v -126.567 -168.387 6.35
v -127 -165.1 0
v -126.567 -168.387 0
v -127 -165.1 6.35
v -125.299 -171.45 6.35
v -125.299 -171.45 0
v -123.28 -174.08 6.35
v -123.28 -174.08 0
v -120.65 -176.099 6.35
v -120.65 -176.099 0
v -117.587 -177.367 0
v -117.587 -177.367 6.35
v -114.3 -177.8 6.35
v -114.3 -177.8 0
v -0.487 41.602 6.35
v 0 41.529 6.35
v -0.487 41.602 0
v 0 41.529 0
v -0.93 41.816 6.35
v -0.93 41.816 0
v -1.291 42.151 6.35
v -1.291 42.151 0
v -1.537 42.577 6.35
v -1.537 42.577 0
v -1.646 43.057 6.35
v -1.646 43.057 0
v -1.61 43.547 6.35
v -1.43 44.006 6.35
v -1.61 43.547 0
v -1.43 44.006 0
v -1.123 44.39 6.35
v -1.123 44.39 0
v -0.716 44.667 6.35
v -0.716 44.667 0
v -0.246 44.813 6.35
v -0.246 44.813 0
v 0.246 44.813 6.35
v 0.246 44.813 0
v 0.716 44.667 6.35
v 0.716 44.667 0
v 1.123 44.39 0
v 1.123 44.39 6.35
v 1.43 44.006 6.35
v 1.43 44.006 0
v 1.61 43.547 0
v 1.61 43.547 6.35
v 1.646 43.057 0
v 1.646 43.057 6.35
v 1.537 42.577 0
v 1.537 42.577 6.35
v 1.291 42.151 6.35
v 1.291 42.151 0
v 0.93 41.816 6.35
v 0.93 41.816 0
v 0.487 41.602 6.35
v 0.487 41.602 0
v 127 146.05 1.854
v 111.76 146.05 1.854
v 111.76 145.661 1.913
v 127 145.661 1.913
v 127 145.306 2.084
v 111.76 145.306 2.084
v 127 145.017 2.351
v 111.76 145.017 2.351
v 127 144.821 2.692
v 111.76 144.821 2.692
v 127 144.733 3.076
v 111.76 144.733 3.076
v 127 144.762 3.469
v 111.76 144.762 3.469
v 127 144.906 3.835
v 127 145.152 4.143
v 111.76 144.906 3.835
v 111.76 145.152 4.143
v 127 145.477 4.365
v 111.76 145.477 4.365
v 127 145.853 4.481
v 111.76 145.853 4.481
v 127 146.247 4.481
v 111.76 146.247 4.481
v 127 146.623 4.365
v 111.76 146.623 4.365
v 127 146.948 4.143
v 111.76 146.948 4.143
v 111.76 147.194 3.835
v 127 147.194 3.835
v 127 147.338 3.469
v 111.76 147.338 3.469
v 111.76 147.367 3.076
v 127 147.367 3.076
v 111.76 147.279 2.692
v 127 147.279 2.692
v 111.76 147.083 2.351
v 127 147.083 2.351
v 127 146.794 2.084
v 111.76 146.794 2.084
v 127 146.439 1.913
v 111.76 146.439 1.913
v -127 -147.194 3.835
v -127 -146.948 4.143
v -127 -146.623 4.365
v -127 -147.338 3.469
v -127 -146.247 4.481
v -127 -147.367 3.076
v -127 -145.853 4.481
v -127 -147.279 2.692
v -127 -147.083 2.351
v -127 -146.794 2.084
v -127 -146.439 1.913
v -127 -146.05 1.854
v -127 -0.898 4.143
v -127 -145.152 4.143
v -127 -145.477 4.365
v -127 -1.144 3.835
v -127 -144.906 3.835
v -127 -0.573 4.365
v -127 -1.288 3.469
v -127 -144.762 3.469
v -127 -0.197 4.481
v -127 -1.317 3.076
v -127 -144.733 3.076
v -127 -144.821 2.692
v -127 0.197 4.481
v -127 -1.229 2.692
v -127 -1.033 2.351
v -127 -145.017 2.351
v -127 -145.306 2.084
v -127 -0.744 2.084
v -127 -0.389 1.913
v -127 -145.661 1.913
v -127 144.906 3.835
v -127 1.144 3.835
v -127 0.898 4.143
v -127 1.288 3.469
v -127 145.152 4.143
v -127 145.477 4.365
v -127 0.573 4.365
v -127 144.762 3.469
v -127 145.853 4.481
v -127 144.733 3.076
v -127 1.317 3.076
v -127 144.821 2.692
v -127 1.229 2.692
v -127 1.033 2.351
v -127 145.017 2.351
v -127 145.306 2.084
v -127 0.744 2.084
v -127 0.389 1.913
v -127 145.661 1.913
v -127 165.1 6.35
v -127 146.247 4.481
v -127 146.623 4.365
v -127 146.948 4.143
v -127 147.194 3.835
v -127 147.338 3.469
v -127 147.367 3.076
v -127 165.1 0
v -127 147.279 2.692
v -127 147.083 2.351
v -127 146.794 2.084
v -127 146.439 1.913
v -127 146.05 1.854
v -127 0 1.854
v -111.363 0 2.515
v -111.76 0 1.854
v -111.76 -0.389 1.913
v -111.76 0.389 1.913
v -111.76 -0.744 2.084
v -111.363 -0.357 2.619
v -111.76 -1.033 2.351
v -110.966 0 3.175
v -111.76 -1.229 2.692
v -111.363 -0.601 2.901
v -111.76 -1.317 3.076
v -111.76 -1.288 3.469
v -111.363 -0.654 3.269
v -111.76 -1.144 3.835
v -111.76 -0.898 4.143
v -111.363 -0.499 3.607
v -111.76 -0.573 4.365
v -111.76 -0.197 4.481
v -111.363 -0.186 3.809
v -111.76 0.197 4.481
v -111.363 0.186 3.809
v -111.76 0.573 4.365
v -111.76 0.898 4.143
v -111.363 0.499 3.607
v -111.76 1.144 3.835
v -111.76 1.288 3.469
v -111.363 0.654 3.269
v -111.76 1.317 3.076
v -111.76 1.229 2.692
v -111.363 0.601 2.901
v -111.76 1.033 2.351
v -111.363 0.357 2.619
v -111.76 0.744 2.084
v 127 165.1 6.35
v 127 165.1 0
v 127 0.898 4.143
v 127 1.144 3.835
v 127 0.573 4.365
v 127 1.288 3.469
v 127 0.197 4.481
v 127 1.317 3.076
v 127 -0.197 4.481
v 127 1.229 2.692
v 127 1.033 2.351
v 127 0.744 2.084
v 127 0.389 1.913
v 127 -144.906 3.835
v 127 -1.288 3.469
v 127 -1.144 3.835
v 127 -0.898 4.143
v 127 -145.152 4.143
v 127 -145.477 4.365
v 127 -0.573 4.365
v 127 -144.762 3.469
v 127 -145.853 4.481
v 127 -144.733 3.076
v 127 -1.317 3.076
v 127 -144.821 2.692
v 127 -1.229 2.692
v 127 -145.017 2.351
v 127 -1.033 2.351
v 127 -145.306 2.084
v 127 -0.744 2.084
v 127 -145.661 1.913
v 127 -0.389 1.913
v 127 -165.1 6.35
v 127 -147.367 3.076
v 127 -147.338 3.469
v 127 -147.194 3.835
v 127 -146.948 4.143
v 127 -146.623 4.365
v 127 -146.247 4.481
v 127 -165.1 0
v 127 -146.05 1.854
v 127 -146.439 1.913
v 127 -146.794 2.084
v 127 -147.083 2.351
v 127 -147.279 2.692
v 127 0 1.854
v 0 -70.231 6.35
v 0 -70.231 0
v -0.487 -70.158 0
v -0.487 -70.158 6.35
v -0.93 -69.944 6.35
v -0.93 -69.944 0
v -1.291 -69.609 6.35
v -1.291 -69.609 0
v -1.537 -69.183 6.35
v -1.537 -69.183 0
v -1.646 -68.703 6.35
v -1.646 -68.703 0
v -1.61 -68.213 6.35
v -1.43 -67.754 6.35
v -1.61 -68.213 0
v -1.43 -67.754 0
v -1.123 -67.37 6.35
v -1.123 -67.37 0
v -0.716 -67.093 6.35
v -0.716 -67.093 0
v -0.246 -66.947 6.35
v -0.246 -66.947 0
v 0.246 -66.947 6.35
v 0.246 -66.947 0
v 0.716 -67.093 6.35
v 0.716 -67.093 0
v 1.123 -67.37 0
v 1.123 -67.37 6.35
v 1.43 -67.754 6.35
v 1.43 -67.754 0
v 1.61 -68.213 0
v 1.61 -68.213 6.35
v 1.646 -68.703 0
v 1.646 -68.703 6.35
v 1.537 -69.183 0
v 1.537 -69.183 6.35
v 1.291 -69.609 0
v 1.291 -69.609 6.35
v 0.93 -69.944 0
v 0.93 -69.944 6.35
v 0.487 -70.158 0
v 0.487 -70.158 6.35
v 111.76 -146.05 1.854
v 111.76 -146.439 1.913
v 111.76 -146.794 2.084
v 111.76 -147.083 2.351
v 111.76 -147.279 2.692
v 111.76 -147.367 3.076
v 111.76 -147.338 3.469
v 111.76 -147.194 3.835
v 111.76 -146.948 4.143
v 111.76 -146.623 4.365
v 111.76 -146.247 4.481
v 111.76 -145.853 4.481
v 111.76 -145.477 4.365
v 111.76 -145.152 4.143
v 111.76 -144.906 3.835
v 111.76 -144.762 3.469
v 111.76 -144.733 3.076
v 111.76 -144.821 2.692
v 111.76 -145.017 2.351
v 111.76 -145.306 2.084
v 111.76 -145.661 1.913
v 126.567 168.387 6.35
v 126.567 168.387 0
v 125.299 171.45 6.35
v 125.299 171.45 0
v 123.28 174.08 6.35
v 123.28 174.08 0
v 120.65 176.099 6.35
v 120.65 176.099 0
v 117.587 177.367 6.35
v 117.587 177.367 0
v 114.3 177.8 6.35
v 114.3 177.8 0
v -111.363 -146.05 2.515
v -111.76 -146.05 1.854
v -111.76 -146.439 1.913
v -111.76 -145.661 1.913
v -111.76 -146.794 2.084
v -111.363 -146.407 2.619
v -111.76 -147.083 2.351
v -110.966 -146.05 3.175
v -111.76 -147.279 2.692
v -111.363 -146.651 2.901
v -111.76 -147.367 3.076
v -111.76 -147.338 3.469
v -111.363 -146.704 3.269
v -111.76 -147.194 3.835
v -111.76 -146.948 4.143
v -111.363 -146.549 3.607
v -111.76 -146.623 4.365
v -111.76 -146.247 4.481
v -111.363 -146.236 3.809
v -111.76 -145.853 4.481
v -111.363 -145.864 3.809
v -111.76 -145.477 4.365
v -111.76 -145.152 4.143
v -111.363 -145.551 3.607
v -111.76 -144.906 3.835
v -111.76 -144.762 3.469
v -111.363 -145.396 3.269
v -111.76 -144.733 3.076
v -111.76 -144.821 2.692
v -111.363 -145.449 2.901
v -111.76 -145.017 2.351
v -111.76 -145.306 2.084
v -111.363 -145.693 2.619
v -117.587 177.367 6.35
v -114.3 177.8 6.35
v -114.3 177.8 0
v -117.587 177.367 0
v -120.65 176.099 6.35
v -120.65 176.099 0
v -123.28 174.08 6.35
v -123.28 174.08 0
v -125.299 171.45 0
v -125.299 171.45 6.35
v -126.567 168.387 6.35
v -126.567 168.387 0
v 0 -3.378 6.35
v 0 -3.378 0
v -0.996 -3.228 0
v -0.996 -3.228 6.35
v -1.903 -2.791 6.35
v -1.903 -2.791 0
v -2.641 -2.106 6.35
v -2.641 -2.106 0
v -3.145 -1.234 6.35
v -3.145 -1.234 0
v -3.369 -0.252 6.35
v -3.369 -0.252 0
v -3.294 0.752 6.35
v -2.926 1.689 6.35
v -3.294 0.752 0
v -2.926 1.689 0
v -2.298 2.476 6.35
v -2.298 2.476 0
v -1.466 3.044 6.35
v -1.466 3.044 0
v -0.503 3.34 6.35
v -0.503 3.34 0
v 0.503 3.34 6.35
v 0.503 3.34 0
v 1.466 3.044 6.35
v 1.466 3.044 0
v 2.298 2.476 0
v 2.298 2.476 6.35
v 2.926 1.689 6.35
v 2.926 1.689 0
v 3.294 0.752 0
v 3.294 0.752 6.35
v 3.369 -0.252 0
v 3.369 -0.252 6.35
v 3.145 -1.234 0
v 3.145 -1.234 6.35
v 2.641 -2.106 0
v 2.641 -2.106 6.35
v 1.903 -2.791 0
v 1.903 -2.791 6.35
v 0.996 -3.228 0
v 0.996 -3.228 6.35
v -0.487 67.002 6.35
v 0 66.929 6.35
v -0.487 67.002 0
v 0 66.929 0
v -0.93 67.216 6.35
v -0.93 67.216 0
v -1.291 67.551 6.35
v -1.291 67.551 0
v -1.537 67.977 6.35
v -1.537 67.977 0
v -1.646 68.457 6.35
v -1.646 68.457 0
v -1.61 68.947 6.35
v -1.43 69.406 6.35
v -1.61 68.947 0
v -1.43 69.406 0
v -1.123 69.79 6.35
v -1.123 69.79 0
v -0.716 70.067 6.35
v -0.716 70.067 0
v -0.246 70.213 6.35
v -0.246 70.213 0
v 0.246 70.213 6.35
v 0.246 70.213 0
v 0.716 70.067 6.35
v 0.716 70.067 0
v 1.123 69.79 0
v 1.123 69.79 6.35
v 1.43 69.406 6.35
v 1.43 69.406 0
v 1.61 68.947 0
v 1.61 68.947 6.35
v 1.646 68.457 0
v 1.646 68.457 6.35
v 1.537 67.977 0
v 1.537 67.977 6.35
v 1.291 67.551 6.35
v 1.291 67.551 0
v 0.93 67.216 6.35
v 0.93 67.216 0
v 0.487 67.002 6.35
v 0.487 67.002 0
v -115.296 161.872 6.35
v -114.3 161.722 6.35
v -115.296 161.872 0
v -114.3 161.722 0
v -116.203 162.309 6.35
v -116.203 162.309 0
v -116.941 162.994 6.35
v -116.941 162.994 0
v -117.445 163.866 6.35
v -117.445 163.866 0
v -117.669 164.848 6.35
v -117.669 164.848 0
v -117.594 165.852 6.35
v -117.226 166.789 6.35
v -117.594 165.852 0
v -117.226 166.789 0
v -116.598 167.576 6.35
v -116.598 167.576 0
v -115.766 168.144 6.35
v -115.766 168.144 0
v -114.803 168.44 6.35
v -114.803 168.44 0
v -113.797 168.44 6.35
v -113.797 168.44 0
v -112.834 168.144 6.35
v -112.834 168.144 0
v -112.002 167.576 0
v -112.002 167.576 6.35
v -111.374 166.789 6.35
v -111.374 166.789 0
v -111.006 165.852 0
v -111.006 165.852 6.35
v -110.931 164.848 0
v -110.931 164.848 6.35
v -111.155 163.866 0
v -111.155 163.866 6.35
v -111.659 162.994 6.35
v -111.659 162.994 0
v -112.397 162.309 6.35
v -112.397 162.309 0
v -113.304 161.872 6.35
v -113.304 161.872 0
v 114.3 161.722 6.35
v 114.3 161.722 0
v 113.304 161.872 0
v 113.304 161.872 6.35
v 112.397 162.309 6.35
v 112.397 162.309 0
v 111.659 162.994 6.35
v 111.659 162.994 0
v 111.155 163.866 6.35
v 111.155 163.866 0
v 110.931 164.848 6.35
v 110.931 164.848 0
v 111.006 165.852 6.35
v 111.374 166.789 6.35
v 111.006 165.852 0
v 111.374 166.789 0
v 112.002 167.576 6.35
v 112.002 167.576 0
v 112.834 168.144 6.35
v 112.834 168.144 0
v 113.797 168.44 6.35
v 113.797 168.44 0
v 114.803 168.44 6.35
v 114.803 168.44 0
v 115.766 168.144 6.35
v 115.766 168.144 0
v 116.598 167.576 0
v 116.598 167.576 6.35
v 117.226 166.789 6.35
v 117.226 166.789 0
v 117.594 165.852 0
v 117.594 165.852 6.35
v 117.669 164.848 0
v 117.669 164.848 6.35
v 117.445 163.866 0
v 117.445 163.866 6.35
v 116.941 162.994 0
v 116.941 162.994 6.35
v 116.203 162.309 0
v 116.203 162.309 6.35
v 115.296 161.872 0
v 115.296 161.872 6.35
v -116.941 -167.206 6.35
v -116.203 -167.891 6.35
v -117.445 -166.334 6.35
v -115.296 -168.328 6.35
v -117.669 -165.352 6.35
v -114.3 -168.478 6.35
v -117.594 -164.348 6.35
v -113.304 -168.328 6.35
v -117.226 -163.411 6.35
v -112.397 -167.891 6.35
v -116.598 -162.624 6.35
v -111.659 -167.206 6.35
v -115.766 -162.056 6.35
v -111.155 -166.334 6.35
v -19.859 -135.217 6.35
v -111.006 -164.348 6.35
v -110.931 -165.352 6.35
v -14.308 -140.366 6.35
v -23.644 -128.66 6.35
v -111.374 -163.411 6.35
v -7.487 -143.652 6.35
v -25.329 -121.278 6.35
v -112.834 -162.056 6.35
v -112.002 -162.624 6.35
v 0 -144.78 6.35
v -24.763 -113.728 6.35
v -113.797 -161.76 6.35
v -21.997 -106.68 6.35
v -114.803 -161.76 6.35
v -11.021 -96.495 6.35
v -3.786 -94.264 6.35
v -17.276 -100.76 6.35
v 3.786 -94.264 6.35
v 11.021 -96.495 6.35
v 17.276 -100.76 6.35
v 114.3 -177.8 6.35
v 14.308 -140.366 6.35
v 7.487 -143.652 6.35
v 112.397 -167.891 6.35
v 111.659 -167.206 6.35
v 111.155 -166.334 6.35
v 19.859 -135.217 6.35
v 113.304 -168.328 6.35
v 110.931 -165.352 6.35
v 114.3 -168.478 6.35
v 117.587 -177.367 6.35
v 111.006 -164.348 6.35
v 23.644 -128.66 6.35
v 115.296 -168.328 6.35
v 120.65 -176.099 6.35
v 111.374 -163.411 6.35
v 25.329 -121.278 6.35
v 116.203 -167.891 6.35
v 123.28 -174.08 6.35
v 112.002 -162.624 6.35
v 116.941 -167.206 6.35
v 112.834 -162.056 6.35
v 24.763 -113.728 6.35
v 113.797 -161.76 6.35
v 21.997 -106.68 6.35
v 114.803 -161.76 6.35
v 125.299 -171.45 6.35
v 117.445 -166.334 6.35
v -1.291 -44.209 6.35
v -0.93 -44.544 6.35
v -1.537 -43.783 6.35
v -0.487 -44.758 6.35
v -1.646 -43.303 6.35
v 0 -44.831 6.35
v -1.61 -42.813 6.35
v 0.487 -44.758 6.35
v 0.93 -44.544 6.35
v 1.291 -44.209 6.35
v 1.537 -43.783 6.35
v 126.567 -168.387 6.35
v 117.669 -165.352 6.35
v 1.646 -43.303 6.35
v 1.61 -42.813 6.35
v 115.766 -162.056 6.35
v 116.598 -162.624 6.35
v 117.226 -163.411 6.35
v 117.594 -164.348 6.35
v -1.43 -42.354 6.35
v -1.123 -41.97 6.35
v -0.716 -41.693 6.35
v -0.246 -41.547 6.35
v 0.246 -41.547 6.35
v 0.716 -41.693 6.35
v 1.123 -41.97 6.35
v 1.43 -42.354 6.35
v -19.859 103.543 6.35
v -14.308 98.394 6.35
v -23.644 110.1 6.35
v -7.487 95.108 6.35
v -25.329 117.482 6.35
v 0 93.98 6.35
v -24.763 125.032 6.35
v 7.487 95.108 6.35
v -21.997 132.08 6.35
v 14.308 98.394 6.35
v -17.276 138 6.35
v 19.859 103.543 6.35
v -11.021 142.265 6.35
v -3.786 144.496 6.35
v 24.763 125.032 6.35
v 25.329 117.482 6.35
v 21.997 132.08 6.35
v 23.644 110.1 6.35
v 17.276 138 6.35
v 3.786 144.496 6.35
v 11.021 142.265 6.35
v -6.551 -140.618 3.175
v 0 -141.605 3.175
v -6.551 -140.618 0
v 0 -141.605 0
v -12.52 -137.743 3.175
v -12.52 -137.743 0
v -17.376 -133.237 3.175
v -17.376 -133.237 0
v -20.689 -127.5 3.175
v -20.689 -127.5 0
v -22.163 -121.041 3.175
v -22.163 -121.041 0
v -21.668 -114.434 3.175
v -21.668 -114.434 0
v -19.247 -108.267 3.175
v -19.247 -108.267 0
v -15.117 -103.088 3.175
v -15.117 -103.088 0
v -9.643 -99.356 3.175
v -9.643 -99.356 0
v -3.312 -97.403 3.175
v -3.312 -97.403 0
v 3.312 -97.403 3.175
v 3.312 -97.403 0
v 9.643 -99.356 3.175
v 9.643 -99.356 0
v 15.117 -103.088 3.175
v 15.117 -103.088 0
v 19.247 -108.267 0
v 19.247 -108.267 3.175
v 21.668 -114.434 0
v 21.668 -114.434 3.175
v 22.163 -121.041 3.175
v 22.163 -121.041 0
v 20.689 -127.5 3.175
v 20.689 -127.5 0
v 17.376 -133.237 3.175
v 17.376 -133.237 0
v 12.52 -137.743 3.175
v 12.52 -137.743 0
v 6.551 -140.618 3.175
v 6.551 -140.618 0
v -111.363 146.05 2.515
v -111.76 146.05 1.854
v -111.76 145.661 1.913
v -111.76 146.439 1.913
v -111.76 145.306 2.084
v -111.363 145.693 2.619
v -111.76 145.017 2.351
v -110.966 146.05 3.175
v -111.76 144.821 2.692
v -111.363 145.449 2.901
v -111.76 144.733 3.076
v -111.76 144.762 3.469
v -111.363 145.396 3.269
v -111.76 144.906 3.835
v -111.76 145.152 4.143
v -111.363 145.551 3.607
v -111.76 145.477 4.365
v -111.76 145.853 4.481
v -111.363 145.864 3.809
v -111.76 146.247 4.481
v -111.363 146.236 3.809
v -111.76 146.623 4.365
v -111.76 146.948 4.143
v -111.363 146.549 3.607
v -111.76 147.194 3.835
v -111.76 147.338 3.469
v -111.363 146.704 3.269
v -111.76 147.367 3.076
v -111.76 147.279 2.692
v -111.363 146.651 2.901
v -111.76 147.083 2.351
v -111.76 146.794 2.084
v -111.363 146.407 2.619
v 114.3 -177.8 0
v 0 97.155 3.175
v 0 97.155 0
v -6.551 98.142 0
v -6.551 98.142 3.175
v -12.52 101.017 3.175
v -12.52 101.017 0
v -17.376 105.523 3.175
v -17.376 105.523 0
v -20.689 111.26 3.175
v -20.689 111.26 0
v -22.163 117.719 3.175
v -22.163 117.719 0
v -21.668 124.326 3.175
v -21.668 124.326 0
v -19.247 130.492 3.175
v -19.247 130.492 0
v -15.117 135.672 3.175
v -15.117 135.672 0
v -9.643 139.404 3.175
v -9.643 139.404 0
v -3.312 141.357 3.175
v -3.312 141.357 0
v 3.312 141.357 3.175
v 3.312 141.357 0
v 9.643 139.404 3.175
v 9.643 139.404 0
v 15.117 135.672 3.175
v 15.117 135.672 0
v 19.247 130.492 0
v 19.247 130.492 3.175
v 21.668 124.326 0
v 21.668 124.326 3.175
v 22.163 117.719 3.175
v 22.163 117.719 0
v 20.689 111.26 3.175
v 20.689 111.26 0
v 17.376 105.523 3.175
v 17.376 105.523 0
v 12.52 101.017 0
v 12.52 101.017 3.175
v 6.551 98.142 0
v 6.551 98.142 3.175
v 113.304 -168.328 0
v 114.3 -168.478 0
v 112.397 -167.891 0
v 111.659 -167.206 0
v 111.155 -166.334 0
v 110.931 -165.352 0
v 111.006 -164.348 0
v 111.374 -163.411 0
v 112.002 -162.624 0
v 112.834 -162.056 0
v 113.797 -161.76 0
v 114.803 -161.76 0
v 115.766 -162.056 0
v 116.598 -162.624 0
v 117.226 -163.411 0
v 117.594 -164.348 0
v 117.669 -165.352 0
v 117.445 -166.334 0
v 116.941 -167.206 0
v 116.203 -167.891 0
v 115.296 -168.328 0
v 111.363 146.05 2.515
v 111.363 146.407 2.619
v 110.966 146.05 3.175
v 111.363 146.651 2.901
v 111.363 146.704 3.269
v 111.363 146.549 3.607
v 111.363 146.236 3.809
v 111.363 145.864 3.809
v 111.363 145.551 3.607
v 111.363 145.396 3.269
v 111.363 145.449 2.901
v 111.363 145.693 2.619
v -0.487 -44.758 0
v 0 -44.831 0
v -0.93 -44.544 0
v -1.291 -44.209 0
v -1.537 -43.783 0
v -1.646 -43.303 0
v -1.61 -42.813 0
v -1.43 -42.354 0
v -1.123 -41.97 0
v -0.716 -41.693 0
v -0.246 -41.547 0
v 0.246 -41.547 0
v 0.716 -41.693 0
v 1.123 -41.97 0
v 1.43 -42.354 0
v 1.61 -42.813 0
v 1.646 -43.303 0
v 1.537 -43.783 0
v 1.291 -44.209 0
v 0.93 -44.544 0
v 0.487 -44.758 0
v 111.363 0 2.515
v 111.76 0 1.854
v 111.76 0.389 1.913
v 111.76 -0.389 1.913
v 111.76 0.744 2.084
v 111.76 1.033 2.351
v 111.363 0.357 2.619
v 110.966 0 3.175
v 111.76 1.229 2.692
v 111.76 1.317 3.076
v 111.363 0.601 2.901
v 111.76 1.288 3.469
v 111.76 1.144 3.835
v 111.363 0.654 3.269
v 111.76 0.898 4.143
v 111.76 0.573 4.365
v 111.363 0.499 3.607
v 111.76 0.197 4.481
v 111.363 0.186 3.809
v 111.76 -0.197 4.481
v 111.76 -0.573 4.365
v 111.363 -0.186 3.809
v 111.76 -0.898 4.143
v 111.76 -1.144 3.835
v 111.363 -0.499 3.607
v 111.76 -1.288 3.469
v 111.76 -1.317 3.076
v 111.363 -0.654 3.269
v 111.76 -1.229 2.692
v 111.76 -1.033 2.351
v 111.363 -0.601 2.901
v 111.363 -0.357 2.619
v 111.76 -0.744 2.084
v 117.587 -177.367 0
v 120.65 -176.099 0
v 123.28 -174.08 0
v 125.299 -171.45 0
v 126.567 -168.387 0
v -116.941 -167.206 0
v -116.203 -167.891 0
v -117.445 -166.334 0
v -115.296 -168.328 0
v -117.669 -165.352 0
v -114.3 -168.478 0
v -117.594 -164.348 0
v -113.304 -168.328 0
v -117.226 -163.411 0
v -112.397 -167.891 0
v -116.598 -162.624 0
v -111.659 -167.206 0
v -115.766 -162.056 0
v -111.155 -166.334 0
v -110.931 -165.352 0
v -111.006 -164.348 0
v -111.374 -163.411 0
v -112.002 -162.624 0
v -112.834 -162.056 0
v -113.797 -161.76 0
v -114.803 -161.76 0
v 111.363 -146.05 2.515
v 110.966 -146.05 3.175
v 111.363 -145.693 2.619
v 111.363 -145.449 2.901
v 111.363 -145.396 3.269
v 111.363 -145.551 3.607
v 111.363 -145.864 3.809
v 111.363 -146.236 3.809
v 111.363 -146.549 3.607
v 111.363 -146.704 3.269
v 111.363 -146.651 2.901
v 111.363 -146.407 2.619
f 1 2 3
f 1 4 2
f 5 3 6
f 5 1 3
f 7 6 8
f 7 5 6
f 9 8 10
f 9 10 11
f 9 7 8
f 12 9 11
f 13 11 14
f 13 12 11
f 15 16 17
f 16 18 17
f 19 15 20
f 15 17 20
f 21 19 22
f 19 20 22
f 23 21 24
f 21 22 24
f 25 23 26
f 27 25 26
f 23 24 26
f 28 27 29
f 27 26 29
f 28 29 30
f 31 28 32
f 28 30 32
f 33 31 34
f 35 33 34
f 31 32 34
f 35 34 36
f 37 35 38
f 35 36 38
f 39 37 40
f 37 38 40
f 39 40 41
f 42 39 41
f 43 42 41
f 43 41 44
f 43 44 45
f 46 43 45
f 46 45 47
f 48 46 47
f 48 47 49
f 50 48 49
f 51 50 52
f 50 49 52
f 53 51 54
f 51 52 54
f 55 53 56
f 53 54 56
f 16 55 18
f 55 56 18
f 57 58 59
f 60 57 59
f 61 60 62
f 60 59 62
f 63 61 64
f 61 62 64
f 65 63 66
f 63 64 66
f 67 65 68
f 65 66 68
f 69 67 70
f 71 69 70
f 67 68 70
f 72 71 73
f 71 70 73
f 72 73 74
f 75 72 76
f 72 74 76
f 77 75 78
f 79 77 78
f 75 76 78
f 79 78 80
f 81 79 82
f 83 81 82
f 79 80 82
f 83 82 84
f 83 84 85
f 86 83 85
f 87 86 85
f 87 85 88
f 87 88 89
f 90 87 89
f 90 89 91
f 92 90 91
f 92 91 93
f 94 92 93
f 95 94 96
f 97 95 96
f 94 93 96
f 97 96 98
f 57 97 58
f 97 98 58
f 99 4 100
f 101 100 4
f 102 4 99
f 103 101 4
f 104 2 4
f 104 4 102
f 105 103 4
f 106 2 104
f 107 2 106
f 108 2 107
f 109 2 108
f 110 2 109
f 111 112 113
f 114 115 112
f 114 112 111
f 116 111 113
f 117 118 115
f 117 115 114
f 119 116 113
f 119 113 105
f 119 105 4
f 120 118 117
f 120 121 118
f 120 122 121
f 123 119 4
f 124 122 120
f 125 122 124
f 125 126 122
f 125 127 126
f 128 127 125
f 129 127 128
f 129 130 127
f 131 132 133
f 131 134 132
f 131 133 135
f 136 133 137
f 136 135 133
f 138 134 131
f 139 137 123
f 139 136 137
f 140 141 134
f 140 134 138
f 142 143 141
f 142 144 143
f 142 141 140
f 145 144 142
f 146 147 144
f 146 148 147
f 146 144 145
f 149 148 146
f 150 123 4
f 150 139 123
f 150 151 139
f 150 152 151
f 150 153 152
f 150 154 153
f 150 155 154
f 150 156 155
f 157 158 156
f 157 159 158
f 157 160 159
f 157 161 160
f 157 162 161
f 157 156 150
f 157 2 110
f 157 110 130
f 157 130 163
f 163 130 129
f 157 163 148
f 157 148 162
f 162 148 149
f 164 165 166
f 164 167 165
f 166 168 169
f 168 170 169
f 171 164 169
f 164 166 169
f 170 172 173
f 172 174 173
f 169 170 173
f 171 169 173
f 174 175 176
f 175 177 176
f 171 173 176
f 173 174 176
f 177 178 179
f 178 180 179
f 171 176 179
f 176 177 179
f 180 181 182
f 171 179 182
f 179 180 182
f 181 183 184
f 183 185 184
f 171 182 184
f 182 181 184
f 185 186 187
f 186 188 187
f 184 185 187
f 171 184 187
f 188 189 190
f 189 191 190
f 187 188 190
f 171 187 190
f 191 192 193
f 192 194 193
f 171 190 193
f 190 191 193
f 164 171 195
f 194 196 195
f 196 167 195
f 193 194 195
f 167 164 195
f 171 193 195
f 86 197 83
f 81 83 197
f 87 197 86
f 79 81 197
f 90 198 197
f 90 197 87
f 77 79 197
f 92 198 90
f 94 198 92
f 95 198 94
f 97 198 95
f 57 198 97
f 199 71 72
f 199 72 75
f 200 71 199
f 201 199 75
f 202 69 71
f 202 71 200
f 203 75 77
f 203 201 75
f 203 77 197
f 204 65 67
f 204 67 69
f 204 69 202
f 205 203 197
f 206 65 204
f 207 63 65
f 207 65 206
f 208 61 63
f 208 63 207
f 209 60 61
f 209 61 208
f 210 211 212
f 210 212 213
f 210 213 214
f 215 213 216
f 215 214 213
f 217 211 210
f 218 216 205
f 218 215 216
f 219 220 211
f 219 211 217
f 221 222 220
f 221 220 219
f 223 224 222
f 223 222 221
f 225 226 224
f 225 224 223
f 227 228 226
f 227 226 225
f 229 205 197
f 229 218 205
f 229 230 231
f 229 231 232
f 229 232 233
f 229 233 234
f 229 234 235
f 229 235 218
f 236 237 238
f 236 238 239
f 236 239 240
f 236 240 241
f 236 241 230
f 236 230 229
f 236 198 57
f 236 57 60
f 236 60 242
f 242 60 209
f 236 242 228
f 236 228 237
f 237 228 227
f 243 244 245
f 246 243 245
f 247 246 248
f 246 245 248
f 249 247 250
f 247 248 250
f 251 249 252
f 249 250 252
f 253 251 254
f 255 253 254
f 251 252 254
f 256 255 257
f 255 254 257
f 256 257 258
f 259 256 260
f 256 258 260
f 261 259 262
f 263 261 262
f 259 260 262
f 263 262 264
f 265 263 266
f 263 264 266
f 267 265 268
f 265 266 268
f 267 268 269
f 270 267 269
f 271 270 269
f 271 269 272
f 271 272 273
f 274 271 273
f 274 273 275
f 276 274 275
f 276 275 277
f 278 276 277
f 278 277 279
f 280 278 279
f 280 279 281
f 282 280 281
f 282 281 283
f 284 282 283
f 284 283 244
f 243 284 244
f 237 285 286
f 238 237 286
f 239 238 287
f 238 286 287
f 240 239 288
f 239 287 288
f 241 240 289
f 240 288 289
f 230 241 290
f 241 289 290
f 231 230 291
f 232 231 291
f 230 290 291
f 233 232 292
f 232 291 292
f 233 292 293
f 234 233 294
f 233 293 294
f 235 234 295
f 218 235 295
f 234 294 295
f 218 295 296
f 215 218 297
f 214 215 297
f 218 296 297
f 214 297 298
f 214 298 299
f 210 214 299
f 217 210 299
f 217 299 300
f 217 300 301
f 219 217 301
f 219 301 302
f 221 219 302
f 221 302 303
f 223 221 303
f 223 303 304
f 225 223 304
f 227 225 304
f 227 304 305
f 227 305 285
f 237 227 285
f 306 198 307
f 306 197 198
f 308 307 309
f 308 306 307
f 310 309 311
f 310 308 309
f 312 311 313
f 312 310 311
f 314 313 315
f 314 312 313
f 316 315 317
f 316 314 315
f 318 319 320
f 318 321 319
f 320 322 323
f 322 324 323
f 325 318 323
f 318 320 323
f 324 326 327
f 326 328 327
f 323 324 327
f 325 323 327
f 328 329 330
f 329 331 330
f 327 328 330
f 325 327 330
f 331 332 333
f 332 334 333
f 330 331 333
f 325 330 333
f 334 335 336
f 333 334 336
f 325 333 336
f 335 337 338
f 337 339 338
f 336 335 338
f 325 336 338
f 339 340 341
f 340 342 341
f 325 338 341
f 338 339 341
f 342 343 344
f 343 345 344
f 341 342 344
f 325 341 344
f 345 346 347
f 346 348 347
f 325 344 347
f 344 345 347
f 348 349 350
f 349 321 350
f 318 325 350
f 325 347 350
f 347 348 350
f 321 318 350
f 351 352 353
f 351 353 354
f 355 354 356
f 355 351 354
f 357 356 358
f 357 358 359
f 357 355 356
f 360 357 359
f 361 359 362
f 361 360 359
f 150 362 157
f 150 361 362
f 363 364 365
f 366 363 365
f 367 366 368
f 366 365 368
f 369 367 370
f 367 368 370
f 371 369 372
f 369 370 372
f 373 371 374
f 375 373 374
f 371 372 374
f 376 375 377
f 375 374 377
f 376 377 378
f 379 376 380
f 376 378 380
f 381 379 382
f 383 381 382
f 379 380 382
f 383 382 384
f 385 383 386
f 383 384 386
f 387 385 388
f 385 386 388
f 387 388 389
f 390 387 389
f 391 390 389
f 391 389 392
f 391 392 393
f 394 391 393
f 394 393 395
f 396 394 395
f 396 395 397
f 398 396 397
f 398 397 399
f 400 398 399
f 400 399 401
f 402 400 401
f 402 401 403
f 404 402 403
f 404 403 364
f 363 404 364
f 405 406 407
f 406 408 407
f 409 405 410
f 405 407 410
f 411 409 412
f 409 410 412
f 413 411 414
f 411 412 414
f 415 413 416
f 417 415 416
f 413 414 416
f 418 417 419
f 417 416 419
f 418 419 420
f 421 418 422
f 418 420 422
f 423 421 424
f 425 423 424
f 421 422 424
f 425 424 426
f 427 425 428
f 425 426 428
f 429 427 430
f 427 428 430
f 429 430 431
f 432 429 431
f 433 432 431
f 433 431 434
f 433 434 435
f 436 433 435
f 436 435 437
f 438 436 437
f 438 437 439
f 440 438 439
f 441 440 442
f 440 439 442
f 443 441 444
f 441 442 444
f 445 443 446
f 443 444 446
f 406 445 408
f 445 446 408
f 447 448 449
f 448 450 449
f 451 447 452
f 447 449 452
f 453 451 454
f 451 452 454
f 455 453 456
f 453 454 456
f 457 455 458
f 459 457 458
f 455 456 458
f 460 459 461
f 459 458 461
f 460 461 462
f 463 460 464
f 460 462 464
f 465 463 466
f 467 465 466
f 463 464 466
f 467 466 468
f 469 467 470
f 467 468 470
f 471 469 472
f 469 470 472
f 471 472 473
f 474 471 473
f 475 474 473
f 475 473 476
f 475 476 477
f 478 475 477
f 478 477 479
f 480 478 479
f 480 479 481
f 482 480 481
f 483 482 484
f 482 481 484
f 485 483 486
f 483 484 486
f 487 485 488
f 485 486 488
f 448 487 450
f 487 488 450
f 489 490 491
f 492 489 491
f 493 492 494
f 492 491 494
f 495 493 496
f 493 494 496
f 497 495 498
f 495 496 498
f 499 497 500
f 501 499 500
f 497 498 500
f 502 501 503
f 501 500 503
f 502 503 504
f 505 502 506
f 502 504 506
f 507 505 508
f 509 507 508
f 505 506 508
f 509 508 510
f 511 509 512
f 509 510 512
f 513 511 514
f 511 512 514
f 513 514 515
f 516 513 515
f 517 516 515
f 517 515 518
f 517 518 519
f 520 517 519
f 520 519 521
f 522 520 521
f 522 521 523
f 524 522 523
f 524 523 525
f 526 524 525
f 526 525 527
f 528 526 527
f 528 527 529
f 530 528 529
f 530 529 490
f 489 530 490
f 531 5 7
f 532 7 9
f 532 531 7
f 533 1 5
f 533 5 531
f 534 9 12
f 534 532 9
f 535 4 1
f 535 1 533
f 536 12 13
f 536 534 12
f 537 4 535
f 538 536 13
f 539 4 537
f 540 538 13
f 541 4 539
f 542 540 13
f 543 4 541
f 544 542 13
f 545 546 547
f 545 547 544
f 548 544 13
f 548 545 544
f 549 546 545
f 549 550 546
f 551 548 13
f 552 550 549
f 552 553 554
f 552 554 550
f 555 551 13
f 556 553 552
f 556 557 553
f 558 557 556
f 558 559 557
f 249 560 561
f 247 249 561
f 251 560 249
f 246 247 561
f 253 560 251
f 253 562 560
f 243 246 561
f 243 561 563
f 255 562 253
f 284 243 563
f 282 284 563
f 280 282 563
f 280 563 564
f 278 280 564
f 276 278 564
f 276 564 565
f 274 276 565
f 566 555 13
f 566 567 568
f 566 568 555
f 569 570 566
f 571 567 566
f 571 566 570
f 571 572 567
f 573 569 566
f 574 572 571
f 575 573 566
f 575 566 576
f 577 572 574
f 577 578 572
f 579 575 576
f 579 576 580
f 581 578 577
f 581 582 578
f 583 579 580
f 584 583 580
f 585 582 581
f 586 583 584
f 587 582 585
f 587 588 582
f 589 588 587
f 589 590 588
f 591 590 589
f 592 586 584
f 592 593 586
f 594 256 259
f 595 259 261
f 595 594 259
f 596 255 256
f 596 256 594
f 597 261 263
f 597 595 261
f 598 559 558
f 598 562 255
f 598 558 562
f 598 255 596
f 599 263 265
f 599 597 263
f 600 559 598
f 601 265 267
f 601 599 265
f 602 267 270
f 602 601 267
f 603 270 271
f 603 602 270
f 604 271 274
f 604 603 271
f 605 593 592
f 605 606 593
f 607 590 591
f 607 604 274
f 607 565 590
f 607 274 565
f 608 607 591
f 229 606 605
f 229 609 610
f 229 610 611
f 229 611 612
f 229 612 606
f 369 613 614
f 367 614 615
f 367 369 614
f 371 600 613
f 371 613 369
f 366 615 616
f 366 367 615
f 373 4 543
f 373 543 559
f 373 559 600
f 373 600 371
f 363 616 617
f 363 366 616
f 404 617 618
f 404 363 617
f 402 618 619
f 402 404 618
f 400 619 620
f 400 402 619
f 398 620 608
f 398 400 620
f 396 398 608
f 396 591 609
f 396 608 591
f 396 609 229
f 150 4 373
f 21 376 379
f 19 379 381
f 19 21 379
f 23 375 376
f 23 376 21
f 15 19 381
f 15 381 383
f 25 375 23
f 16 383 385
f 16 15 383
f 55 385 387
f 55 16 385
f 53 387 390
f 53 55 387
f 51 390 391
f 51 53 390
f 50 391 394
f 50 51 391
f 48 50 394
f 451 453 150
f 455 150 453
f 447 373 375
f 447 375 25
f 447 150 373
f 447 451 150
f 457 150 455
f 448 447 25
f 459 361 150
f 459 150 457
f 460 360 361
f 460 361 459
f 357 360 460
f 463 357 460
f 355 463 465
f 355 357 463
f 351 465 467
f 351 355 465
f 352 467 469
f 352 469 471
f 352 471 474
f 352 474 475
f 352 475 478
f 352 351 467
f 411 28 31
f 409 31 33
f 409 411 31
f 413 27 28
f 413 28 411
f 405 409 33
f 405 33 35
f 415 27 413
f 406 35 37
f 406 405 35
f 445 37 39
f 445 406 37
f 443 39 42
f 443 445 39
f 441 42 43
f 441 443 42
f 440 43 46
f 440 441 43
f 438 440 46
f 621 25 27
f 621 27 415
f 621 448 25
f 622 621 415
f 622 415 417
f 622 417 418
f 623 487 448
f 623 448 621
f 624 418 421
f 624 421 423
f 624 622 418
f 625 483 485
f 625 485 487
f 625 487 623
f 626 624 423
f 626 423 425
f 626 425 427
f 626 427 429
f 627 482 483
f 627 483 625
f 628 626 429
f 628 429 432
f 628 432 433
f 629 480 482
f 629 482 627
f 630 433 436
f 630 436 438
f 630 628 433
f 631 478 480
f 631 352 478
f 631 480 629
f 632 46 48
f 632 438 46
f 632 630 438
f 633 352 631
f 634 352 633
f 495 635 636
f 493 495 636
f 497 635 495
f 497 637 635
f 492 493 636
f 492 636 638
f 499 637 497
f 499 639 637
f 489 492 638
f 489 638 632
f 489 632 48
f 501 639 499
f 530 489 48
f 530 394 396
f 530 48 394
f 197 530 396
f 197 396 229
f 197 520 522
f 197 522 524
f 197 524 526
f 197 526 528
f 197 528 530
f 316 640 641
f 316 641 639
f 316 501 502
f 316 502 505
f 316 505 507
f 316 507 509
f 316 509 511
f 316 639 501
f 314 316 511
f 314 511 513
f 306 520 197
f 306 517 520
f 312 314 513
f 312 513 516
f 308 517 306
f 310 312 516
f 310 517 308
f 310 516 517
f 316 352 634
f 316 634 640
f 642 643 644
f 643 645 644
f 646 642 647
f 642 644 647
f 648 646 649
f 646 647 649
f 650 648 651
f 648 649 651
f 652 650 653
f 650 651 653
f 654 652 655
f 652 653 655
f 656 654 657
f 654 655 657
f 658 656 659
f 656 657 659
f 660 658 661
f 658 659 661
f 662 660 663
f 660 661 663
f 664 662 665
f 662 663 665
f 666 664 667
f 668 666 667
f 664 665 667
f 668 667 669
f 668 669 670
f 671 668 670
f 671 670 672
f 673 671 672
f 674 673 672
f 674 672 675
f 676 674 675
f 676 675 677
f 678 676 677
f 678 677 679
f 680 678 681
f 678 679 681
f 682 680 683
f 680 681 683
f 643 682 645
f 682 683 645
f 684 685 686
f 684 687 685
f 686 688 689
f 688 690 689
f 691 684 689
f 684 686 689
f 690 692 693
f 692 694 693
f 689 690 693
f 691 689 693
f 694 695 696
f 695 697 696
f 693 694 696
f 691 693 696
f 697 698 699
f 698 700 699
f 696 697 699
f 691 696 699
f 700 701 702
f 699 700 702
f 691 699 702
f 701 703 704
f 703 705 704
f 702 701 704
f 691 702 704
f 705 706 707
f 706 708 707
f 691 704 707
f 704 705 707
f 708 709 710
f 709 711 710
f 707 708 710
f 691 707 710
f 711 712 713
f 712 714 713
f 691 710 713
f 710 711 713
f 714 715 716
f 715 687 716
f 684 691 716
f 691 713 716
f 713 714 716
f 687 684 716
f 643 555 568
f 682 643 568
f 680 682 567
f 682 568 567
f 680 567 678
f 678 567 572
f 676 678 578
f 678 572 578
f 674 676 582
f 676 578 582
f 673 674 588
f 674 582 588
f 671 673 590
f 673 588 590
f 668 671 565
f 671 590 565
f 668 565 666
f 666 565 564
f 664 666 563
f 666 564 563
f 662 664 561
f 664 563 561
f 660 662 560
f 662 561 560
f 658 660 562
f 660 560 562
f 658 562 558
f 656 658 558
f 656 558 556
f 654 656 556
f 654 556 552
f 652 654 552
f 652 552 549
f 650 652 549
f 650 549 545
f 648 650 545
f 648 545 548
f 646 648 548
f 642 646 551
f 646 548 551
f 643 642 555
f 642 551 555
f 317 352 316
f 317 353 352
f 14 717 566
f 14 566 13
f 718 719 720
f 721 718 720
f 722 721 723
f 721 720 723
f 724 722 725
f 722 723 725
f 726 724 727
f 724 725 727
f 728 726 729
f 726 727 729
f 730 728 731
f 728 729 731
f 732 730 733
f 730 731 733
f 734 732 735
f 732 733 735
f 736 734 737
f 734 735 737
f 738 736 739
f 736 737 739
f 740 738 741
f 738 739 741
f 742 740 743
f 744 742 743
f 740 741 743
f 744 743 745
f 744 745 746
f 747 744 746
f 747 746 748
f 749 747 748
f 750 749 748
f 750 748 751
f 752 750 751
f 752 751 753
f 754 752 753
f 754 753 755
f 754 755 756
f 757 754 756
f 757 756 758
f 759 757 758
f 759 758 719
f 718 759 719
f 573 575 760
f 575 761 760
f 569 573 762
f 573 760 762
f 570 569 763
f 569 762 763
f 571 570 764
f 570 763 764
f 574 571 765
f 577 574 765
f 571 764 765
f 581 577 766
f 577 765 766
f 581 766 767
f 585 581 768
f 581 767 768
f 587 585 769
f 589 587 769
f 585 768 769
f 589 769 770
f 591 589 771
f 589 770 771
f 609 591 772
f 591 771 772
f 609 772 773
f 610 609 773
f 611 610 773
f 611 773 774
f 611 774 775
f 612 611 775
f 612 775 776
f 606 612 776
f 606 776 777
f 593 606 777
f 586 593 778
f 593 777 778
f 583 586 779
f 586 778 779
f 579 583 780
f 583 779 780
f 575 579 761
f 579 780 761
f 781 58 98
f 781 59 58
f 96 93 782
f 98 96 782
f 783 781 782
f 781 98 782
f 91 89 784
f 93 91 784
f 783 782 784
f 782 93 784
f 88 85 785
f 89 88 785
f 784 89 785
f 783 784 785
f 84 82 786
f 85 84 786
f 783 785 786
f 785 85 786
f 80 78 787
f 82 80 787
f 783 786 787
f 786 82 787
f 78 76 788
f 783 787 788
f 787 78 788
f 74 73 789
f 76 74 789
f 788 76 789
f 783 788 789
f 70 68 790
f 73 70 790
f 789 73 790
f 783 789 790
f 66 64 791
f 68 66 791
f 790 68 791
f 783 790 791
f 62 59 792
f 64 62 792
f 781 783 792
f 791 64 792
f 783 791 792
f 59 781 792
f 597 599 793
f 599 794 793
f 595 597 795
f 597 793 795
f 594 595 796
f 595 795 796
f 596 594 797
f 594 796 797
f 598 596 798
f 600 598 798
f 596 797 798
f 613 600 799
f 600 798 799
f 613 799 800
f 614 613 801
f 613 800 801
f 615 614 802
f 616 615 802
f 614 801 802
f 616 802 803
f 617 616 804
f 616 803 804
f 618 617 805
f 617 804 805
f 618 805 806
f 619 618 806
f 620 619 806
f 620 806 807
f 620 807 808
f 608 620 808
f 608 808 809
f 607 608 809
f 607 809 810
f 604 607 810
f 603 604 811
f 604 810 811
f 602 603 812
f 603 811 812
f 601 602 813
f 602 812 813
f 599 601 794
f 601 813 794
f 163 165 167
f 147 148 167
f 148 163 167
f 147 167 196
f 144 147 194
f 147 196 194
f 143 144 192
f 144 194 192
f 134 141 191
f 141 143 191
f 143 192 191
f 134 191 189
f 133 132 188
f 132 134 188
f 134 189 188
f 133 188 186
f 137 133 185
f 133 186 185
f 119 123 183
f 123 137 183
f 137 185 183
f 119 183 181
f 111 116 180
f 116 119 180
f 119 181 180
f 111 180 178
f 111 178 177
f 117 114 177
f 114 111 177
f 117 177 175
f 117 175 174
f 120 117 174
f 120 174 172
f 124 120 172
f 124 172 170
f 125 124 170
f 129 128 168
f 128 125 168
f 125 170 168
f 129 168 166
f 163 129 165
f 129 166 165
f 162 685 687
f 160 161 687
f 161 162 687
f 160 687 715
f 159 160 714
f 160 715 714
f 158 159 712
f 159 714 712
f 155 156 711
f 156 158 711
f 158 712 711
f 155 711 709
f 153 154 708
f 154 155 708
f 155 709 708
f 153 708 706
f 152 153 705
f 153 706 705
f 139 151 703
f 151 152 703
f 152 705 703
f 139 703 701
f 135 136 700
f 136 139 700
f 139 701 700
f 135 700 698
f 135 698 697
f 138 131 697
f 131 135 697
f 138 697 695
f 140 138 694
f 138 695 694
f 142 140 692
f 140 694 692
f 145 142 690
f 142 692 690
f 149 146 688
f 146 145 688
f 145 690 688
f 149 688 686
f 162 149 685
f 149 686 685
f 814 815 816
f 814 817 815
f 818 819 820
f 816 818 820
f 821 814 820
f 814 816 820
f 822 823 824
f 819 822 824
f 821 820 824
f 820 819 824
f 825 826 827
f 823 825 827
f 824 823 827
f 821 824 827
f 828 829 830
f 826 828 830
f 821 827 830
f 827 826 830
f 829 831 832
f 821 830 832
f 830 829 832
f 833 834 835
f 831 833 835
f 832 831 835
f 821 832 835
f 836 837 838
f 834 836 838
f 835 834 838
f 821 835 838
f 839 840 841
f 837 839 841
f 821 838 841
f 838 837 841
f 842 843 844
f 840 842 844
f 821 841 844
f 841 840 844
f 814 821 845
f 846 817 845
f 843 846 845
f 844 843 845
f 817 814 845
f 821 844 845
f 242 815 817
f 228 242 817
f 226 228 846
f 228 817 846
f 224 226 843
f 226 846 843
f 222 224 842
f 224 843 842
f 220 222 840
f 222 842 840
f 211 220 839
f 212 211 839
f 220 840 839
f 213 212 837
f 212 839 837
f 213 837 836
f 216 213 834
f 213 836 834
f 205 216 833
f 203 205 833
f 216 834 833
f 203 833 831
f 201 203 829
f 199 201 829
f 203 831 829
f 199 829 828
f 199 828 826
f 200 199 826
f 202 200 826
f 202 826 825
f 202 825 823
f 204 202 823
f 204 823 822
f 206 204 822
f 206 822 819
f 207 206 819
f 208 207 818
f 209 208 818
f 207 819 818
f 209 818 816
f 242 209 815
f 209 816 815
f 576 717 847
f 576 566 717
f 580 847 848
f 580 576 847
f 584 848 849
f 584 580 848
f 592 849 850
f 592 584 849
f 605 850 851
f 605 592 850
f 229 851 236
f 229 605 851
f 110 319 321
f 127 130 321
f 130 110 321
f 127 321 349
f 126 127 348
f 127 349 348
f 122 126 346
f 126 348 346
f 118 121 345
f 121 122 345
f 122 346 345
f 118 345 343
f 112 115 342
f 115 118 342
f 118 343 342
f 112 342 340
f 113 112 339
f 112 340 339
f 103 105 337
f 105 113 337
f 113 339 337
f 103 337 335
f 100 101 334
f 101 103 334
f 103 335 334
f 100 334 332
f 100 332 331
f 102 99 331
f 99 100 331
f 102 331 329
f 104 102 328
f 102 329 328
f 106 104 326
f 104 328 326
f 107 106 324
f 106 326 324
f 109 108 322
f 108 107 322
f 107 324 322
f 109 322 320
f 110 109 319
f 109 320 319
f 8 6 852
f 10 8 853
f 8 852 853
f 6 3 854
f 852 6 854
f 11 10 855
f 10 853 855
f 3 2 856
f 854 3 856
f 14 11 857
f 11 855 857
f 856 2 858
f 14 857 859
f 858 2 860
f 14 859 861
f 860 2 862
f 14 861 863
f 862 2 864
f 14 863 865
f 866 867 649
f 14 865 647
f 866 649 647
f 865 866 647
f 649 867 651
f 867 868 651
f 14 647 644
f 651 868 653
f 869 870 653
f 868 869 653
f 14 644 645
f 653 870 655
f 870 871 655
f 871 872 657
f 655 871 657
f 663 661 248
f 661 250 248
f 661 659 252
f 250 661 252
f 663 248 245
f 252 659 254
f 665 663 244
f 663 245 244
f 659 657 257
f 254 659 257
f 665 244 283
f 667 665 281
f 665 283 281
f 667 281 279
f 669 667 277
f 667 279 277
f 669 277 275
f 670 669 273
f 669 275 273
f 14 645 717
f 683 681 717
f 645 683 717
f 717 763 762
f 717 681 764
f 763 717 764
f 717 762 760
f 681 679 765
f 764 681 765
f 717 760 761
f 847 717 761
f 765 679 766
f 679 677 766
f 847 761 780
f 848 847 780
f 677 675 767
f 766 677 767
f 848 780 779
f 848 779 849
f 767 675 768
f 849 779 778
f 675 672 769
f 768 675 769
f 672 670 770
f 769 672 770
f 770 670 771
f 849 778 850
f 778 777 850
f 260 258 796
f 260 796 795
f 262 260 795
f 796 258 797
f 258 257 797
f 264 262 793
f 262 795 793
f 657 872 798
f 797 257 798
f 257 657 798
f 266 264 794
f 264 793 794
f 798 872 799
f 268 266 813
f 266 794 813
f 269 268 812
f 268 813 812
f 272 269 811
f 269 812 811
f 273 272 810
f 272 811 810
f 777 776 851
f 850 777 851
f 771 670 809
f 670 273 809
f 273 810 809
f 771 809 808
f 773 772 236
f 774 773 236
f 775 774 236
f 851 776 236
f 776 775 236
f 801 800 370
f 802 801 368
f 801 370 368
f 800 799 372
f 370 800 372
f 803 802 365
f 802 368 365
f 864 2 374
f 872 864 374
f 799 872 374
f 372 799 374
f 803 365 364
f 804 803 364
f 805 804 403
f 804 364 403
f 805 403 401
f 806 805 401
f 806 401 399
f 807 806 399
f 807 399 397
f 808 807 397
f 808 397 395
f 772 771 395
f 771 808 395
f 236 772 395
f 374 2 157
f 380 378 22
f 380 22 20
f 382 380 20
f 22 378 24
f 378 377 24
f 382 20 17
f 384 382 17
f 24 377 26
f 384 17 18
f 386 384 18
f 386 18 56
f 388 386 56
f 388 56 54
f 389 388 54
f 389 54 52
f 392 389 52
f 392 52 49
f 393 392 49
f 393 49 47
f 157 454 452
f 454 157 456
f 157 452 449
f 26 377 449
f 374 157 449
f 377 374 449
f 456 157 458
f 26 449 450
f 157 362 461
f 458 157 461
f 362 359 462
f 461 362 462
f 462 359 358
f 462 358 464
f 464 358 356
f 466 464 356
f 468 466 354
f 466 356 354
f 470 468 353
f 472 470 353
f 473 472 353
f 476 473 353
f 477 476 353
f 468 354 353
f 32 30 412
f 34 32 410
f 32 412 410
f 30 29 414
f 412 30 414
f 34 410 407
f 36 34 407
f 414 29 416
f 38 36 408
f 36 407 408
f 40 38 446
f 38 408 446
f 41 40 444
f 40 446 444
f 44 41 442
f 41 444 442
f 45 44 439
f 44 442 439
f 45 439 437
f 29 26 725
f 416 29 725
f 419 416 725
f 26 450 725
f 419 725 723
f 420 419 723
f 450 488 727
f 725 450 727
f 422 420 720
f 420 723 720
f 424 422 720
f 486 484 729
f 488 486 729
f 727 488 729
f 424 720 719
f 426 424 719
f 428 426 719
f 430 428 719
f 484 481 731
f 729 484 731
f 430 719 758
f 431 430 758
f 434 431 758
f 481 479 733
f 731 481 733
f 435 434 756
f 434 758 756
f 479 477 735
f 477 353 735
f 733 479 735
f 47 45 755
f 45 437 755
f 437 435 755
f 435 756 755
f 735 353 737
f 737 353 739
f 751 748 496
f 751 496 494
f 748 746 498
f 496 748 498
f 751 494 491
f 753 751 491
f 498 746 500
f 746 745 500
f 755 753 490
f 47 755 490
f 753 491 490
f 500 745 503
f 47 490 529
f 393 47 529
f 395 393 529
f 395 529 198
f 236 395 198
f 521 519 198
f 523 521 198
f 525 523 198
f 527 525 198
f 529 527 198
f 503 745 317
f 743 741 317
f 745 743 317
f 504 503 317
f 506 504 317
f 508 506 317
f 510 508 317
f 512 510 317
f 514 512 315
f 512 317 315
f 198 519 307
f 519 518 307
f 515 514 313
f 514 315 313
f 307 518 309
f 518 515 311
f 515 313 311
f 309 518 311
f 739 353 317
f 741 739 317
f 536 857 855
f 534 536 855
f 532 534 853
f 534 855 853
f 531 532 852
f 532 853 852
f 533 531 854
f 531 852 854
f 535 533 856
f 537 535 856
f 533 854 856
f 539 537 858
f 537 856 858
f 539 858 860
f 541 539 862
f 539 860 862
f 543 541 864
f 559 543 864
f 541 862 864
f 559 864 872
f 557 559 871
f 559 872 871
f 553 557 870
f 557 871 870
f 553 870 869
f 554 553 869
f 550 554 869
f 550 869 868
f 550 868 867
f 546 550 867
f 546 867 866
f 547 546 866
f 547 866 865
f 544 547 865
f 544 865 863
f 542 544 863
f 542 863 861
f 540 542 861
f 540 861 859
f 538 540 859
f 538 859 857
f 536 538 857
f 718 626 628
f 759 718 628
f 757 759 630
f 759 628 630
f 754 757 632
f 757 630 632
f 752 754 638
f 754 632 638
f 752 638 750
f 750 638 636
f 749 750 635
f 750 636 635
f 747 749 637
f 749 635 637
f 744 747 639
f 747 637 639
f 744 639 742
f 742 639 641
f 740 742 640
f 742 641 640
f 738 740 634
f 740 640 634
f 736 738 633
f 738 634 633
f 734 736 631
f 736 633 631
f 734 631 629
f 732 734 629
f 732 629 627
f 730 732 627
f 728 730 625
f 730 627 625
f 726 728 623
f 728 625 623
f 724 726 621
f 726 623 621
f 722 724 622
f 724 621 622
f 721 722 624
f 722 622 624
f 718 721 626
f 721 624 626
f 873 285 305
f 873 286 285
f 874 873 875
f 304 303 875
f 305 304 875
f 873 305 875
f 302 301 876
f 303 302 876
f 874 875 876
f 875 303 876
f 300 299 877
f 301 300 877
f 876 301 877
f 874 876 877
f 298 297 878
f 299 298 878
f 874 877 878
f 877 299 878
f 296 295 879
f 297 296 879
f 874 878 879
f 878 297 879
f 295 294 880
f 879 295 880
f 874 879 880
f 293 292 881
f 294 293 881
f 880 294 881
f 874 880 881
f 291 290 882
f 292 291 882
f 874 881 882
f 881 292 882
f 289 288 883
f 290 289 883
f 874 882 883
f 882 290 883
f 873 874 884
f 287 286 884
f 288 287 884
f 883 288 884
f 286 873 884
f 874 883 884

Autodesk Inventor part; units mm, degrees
ref_plane "YZ Plane" through (0, 0, 0) normal (1, 0, 0) x (0, 1, 0)
ref_plane "XZ Plane" through (0, 0, 0) normal (0, 1, 0) x (-1, 0, 0)
ref_plane "XY Plane" through (0, 0, 0) normal (0, 0, 1) x (1, 0, 0)
sketch "Sketch1" plane through (0, 0, 0) normal (0, 0, 1) x (1, 0, 0)
  line L0 (-127, 177.8) -> (127, 177.8)
  line L1 (127, 177.8) -> (127, -177.8)
  line L2 (127, -177.8) -> (-127, -177.8)
  line L3 (-127, -177.8) -> (-127, 177.8)
  point P0 (0, 0)
  dimension "d0" = 254
  dimension "d1" = 127
  dimension "d2" = 355.6
  dimension "d3" = 177.8
extrude "Extrusion1" add sketch "Sketch1" along normal blind 6.35
sketch "Sketch2" plane through (0, 0, 6.35) normal (0, 0, 1) x (1, 0, 0)
  line L0 (-114.3, 165.1) -> (114.3, 165.1) construction
  line L1 (114.3, 165.1) -> (114.3, -165.1) construction
  line L2 (114.3, -165.1) -> (-114.3, -165.1) construction
  line L3 (-114.3, -165.1) -> (-114.3, 165.1) construction
  line L4 (-127, 177.8) -> (127, 177.8) construction
  line L5 (127, -177.8) -> (-127, -177.8) construction
  line L6 (-127, -177.8) -> (-127, 177.8) construction
  line L7 (127, 177.8) -> (127, -177.8) construction
  point P0 (0, 0)
  point P1 (0, 0)
  dimension "d6" = 12.7
  dimension "d7" = 12.7
  dimension "d8" = 12.7
  dimension "d9" = 12.7
hole "Hole1" at (-114.3, 165.1, 6.35) at (114.3, 165.1, 6.35) at (114.3, -165.1, 6.35) at (-114.3, -165.1, 6.35) at (0, 0, 6.35) direction (0, 0, -1) diameter 6.7564 end through all clearance for "Flat Head Machine Screw (82)" size "1/4" standard "Ansi Unified Screw Threads"
sketch "Sketch3" plane through (0, 0, 6.35) normal (0, 0, 1) x (1, 0, 0)
  line L0 (0, 248.92) -> (0, -248.92) construction
  point P0 (0, 0)
  point P1 (0, 119.38)
  point P2 (0, -119.38)
  dimension "d17" = 238.76
  dimension "d18" = 119.38
hole "Hole2" at (0, 119.38, 6.35) at (0, -119.38, 6.35) direction (0, 0, -1) diameter 44.45 end through all
sketch "Sketch4" plane through (0, 0, 6.35) normal (0, 0, 1) x (1, 0, 0)
  line L0 (0, -248.92) -> (0, 248.92) construction
  circle A0 centre (0, 119.38) radius 22.225 construction
  circle A1 centre (0, -119.38) radius 22.225 construction
  line L1 (-177.8, 0) -> (177.8, 0) construction
  point P0 (0, 0)
  point P1 (0, 68.58)
  point P2 (0, 43.18)
  point P3 (0, -68.58)
  point P4 (0, -43.18)
  dimension "d26" = 50.8
  dimension "d27" = 25.4
  dimension "d28" = 50.8
  dimension "d29" = 25.4
hole "Hole3" at (0, 68.58, 6.35) at (0, 43.18, 6.35) at (0, -68.58, 6.35) at (0, -43.18, 6.35) direction (0, 0, -1) diameter 3.302 end through all thread size "8-32 UNC" class "2B" standard "ANSI Unified Screw Threads"
fillet "Fillet1" radius 12.7 4 edges at (127, -177.8, 3.175) (-127, -177.8, 3.175) (127, 177.8, 3.175) (-127, 177.8, 3.175)
chamfer "Chamfer1" distance 3.175 angle 45 2 edges at (0, -97.155, 6.35) (0, 141.605, 6.35)
sketch "Sketch6" plane through (127, -165.1, 0) normal (1, 0, 0) x (0, 0, -1)
  line L0 (-6.35, 330.2) -> (0, 330.2) projected
  line L1 (-6.35, 330.2) -> (-6.35, 0) projected
  line L2 (0, 0) -> (-6.35, 0) projected
  line L3 (0, 330.2) -> (0, 0) projected
  line L4 (-3.175, 330.2) -> (-3.175, 0) construction
  line L5 (0, 165.1) -> (-6.35, 165.1) construction
  point P0 (-3.175, 165.1)
  point P1 (-3.175, 311.15)
  point P2 (-3.175, 19.05)
  dimension "d52" = 146.05
hole "Hole5" at (127, 0, 3.175) at (127, 146.05, 3.175) at (127, -146.05, 3.175) direction (-1, 0, 0) diameter 2.6416 depth 15.24 tip angle 118 thread size "6-32 UNC" class "2B" standard "ANSI Unified Screw Threads"
mirror "Mirror1" about plane through (0, 0, 0) normal (1, 0, 0) of "Hole5"
equation "\"d1\" = 0.5 * d0"
equation "\"d3\" = 0.5 * d2"
equation "\"d18\" = 0.5 * d17"
properties part number "J001395" material "ALUMINUM, 6061-T651"
